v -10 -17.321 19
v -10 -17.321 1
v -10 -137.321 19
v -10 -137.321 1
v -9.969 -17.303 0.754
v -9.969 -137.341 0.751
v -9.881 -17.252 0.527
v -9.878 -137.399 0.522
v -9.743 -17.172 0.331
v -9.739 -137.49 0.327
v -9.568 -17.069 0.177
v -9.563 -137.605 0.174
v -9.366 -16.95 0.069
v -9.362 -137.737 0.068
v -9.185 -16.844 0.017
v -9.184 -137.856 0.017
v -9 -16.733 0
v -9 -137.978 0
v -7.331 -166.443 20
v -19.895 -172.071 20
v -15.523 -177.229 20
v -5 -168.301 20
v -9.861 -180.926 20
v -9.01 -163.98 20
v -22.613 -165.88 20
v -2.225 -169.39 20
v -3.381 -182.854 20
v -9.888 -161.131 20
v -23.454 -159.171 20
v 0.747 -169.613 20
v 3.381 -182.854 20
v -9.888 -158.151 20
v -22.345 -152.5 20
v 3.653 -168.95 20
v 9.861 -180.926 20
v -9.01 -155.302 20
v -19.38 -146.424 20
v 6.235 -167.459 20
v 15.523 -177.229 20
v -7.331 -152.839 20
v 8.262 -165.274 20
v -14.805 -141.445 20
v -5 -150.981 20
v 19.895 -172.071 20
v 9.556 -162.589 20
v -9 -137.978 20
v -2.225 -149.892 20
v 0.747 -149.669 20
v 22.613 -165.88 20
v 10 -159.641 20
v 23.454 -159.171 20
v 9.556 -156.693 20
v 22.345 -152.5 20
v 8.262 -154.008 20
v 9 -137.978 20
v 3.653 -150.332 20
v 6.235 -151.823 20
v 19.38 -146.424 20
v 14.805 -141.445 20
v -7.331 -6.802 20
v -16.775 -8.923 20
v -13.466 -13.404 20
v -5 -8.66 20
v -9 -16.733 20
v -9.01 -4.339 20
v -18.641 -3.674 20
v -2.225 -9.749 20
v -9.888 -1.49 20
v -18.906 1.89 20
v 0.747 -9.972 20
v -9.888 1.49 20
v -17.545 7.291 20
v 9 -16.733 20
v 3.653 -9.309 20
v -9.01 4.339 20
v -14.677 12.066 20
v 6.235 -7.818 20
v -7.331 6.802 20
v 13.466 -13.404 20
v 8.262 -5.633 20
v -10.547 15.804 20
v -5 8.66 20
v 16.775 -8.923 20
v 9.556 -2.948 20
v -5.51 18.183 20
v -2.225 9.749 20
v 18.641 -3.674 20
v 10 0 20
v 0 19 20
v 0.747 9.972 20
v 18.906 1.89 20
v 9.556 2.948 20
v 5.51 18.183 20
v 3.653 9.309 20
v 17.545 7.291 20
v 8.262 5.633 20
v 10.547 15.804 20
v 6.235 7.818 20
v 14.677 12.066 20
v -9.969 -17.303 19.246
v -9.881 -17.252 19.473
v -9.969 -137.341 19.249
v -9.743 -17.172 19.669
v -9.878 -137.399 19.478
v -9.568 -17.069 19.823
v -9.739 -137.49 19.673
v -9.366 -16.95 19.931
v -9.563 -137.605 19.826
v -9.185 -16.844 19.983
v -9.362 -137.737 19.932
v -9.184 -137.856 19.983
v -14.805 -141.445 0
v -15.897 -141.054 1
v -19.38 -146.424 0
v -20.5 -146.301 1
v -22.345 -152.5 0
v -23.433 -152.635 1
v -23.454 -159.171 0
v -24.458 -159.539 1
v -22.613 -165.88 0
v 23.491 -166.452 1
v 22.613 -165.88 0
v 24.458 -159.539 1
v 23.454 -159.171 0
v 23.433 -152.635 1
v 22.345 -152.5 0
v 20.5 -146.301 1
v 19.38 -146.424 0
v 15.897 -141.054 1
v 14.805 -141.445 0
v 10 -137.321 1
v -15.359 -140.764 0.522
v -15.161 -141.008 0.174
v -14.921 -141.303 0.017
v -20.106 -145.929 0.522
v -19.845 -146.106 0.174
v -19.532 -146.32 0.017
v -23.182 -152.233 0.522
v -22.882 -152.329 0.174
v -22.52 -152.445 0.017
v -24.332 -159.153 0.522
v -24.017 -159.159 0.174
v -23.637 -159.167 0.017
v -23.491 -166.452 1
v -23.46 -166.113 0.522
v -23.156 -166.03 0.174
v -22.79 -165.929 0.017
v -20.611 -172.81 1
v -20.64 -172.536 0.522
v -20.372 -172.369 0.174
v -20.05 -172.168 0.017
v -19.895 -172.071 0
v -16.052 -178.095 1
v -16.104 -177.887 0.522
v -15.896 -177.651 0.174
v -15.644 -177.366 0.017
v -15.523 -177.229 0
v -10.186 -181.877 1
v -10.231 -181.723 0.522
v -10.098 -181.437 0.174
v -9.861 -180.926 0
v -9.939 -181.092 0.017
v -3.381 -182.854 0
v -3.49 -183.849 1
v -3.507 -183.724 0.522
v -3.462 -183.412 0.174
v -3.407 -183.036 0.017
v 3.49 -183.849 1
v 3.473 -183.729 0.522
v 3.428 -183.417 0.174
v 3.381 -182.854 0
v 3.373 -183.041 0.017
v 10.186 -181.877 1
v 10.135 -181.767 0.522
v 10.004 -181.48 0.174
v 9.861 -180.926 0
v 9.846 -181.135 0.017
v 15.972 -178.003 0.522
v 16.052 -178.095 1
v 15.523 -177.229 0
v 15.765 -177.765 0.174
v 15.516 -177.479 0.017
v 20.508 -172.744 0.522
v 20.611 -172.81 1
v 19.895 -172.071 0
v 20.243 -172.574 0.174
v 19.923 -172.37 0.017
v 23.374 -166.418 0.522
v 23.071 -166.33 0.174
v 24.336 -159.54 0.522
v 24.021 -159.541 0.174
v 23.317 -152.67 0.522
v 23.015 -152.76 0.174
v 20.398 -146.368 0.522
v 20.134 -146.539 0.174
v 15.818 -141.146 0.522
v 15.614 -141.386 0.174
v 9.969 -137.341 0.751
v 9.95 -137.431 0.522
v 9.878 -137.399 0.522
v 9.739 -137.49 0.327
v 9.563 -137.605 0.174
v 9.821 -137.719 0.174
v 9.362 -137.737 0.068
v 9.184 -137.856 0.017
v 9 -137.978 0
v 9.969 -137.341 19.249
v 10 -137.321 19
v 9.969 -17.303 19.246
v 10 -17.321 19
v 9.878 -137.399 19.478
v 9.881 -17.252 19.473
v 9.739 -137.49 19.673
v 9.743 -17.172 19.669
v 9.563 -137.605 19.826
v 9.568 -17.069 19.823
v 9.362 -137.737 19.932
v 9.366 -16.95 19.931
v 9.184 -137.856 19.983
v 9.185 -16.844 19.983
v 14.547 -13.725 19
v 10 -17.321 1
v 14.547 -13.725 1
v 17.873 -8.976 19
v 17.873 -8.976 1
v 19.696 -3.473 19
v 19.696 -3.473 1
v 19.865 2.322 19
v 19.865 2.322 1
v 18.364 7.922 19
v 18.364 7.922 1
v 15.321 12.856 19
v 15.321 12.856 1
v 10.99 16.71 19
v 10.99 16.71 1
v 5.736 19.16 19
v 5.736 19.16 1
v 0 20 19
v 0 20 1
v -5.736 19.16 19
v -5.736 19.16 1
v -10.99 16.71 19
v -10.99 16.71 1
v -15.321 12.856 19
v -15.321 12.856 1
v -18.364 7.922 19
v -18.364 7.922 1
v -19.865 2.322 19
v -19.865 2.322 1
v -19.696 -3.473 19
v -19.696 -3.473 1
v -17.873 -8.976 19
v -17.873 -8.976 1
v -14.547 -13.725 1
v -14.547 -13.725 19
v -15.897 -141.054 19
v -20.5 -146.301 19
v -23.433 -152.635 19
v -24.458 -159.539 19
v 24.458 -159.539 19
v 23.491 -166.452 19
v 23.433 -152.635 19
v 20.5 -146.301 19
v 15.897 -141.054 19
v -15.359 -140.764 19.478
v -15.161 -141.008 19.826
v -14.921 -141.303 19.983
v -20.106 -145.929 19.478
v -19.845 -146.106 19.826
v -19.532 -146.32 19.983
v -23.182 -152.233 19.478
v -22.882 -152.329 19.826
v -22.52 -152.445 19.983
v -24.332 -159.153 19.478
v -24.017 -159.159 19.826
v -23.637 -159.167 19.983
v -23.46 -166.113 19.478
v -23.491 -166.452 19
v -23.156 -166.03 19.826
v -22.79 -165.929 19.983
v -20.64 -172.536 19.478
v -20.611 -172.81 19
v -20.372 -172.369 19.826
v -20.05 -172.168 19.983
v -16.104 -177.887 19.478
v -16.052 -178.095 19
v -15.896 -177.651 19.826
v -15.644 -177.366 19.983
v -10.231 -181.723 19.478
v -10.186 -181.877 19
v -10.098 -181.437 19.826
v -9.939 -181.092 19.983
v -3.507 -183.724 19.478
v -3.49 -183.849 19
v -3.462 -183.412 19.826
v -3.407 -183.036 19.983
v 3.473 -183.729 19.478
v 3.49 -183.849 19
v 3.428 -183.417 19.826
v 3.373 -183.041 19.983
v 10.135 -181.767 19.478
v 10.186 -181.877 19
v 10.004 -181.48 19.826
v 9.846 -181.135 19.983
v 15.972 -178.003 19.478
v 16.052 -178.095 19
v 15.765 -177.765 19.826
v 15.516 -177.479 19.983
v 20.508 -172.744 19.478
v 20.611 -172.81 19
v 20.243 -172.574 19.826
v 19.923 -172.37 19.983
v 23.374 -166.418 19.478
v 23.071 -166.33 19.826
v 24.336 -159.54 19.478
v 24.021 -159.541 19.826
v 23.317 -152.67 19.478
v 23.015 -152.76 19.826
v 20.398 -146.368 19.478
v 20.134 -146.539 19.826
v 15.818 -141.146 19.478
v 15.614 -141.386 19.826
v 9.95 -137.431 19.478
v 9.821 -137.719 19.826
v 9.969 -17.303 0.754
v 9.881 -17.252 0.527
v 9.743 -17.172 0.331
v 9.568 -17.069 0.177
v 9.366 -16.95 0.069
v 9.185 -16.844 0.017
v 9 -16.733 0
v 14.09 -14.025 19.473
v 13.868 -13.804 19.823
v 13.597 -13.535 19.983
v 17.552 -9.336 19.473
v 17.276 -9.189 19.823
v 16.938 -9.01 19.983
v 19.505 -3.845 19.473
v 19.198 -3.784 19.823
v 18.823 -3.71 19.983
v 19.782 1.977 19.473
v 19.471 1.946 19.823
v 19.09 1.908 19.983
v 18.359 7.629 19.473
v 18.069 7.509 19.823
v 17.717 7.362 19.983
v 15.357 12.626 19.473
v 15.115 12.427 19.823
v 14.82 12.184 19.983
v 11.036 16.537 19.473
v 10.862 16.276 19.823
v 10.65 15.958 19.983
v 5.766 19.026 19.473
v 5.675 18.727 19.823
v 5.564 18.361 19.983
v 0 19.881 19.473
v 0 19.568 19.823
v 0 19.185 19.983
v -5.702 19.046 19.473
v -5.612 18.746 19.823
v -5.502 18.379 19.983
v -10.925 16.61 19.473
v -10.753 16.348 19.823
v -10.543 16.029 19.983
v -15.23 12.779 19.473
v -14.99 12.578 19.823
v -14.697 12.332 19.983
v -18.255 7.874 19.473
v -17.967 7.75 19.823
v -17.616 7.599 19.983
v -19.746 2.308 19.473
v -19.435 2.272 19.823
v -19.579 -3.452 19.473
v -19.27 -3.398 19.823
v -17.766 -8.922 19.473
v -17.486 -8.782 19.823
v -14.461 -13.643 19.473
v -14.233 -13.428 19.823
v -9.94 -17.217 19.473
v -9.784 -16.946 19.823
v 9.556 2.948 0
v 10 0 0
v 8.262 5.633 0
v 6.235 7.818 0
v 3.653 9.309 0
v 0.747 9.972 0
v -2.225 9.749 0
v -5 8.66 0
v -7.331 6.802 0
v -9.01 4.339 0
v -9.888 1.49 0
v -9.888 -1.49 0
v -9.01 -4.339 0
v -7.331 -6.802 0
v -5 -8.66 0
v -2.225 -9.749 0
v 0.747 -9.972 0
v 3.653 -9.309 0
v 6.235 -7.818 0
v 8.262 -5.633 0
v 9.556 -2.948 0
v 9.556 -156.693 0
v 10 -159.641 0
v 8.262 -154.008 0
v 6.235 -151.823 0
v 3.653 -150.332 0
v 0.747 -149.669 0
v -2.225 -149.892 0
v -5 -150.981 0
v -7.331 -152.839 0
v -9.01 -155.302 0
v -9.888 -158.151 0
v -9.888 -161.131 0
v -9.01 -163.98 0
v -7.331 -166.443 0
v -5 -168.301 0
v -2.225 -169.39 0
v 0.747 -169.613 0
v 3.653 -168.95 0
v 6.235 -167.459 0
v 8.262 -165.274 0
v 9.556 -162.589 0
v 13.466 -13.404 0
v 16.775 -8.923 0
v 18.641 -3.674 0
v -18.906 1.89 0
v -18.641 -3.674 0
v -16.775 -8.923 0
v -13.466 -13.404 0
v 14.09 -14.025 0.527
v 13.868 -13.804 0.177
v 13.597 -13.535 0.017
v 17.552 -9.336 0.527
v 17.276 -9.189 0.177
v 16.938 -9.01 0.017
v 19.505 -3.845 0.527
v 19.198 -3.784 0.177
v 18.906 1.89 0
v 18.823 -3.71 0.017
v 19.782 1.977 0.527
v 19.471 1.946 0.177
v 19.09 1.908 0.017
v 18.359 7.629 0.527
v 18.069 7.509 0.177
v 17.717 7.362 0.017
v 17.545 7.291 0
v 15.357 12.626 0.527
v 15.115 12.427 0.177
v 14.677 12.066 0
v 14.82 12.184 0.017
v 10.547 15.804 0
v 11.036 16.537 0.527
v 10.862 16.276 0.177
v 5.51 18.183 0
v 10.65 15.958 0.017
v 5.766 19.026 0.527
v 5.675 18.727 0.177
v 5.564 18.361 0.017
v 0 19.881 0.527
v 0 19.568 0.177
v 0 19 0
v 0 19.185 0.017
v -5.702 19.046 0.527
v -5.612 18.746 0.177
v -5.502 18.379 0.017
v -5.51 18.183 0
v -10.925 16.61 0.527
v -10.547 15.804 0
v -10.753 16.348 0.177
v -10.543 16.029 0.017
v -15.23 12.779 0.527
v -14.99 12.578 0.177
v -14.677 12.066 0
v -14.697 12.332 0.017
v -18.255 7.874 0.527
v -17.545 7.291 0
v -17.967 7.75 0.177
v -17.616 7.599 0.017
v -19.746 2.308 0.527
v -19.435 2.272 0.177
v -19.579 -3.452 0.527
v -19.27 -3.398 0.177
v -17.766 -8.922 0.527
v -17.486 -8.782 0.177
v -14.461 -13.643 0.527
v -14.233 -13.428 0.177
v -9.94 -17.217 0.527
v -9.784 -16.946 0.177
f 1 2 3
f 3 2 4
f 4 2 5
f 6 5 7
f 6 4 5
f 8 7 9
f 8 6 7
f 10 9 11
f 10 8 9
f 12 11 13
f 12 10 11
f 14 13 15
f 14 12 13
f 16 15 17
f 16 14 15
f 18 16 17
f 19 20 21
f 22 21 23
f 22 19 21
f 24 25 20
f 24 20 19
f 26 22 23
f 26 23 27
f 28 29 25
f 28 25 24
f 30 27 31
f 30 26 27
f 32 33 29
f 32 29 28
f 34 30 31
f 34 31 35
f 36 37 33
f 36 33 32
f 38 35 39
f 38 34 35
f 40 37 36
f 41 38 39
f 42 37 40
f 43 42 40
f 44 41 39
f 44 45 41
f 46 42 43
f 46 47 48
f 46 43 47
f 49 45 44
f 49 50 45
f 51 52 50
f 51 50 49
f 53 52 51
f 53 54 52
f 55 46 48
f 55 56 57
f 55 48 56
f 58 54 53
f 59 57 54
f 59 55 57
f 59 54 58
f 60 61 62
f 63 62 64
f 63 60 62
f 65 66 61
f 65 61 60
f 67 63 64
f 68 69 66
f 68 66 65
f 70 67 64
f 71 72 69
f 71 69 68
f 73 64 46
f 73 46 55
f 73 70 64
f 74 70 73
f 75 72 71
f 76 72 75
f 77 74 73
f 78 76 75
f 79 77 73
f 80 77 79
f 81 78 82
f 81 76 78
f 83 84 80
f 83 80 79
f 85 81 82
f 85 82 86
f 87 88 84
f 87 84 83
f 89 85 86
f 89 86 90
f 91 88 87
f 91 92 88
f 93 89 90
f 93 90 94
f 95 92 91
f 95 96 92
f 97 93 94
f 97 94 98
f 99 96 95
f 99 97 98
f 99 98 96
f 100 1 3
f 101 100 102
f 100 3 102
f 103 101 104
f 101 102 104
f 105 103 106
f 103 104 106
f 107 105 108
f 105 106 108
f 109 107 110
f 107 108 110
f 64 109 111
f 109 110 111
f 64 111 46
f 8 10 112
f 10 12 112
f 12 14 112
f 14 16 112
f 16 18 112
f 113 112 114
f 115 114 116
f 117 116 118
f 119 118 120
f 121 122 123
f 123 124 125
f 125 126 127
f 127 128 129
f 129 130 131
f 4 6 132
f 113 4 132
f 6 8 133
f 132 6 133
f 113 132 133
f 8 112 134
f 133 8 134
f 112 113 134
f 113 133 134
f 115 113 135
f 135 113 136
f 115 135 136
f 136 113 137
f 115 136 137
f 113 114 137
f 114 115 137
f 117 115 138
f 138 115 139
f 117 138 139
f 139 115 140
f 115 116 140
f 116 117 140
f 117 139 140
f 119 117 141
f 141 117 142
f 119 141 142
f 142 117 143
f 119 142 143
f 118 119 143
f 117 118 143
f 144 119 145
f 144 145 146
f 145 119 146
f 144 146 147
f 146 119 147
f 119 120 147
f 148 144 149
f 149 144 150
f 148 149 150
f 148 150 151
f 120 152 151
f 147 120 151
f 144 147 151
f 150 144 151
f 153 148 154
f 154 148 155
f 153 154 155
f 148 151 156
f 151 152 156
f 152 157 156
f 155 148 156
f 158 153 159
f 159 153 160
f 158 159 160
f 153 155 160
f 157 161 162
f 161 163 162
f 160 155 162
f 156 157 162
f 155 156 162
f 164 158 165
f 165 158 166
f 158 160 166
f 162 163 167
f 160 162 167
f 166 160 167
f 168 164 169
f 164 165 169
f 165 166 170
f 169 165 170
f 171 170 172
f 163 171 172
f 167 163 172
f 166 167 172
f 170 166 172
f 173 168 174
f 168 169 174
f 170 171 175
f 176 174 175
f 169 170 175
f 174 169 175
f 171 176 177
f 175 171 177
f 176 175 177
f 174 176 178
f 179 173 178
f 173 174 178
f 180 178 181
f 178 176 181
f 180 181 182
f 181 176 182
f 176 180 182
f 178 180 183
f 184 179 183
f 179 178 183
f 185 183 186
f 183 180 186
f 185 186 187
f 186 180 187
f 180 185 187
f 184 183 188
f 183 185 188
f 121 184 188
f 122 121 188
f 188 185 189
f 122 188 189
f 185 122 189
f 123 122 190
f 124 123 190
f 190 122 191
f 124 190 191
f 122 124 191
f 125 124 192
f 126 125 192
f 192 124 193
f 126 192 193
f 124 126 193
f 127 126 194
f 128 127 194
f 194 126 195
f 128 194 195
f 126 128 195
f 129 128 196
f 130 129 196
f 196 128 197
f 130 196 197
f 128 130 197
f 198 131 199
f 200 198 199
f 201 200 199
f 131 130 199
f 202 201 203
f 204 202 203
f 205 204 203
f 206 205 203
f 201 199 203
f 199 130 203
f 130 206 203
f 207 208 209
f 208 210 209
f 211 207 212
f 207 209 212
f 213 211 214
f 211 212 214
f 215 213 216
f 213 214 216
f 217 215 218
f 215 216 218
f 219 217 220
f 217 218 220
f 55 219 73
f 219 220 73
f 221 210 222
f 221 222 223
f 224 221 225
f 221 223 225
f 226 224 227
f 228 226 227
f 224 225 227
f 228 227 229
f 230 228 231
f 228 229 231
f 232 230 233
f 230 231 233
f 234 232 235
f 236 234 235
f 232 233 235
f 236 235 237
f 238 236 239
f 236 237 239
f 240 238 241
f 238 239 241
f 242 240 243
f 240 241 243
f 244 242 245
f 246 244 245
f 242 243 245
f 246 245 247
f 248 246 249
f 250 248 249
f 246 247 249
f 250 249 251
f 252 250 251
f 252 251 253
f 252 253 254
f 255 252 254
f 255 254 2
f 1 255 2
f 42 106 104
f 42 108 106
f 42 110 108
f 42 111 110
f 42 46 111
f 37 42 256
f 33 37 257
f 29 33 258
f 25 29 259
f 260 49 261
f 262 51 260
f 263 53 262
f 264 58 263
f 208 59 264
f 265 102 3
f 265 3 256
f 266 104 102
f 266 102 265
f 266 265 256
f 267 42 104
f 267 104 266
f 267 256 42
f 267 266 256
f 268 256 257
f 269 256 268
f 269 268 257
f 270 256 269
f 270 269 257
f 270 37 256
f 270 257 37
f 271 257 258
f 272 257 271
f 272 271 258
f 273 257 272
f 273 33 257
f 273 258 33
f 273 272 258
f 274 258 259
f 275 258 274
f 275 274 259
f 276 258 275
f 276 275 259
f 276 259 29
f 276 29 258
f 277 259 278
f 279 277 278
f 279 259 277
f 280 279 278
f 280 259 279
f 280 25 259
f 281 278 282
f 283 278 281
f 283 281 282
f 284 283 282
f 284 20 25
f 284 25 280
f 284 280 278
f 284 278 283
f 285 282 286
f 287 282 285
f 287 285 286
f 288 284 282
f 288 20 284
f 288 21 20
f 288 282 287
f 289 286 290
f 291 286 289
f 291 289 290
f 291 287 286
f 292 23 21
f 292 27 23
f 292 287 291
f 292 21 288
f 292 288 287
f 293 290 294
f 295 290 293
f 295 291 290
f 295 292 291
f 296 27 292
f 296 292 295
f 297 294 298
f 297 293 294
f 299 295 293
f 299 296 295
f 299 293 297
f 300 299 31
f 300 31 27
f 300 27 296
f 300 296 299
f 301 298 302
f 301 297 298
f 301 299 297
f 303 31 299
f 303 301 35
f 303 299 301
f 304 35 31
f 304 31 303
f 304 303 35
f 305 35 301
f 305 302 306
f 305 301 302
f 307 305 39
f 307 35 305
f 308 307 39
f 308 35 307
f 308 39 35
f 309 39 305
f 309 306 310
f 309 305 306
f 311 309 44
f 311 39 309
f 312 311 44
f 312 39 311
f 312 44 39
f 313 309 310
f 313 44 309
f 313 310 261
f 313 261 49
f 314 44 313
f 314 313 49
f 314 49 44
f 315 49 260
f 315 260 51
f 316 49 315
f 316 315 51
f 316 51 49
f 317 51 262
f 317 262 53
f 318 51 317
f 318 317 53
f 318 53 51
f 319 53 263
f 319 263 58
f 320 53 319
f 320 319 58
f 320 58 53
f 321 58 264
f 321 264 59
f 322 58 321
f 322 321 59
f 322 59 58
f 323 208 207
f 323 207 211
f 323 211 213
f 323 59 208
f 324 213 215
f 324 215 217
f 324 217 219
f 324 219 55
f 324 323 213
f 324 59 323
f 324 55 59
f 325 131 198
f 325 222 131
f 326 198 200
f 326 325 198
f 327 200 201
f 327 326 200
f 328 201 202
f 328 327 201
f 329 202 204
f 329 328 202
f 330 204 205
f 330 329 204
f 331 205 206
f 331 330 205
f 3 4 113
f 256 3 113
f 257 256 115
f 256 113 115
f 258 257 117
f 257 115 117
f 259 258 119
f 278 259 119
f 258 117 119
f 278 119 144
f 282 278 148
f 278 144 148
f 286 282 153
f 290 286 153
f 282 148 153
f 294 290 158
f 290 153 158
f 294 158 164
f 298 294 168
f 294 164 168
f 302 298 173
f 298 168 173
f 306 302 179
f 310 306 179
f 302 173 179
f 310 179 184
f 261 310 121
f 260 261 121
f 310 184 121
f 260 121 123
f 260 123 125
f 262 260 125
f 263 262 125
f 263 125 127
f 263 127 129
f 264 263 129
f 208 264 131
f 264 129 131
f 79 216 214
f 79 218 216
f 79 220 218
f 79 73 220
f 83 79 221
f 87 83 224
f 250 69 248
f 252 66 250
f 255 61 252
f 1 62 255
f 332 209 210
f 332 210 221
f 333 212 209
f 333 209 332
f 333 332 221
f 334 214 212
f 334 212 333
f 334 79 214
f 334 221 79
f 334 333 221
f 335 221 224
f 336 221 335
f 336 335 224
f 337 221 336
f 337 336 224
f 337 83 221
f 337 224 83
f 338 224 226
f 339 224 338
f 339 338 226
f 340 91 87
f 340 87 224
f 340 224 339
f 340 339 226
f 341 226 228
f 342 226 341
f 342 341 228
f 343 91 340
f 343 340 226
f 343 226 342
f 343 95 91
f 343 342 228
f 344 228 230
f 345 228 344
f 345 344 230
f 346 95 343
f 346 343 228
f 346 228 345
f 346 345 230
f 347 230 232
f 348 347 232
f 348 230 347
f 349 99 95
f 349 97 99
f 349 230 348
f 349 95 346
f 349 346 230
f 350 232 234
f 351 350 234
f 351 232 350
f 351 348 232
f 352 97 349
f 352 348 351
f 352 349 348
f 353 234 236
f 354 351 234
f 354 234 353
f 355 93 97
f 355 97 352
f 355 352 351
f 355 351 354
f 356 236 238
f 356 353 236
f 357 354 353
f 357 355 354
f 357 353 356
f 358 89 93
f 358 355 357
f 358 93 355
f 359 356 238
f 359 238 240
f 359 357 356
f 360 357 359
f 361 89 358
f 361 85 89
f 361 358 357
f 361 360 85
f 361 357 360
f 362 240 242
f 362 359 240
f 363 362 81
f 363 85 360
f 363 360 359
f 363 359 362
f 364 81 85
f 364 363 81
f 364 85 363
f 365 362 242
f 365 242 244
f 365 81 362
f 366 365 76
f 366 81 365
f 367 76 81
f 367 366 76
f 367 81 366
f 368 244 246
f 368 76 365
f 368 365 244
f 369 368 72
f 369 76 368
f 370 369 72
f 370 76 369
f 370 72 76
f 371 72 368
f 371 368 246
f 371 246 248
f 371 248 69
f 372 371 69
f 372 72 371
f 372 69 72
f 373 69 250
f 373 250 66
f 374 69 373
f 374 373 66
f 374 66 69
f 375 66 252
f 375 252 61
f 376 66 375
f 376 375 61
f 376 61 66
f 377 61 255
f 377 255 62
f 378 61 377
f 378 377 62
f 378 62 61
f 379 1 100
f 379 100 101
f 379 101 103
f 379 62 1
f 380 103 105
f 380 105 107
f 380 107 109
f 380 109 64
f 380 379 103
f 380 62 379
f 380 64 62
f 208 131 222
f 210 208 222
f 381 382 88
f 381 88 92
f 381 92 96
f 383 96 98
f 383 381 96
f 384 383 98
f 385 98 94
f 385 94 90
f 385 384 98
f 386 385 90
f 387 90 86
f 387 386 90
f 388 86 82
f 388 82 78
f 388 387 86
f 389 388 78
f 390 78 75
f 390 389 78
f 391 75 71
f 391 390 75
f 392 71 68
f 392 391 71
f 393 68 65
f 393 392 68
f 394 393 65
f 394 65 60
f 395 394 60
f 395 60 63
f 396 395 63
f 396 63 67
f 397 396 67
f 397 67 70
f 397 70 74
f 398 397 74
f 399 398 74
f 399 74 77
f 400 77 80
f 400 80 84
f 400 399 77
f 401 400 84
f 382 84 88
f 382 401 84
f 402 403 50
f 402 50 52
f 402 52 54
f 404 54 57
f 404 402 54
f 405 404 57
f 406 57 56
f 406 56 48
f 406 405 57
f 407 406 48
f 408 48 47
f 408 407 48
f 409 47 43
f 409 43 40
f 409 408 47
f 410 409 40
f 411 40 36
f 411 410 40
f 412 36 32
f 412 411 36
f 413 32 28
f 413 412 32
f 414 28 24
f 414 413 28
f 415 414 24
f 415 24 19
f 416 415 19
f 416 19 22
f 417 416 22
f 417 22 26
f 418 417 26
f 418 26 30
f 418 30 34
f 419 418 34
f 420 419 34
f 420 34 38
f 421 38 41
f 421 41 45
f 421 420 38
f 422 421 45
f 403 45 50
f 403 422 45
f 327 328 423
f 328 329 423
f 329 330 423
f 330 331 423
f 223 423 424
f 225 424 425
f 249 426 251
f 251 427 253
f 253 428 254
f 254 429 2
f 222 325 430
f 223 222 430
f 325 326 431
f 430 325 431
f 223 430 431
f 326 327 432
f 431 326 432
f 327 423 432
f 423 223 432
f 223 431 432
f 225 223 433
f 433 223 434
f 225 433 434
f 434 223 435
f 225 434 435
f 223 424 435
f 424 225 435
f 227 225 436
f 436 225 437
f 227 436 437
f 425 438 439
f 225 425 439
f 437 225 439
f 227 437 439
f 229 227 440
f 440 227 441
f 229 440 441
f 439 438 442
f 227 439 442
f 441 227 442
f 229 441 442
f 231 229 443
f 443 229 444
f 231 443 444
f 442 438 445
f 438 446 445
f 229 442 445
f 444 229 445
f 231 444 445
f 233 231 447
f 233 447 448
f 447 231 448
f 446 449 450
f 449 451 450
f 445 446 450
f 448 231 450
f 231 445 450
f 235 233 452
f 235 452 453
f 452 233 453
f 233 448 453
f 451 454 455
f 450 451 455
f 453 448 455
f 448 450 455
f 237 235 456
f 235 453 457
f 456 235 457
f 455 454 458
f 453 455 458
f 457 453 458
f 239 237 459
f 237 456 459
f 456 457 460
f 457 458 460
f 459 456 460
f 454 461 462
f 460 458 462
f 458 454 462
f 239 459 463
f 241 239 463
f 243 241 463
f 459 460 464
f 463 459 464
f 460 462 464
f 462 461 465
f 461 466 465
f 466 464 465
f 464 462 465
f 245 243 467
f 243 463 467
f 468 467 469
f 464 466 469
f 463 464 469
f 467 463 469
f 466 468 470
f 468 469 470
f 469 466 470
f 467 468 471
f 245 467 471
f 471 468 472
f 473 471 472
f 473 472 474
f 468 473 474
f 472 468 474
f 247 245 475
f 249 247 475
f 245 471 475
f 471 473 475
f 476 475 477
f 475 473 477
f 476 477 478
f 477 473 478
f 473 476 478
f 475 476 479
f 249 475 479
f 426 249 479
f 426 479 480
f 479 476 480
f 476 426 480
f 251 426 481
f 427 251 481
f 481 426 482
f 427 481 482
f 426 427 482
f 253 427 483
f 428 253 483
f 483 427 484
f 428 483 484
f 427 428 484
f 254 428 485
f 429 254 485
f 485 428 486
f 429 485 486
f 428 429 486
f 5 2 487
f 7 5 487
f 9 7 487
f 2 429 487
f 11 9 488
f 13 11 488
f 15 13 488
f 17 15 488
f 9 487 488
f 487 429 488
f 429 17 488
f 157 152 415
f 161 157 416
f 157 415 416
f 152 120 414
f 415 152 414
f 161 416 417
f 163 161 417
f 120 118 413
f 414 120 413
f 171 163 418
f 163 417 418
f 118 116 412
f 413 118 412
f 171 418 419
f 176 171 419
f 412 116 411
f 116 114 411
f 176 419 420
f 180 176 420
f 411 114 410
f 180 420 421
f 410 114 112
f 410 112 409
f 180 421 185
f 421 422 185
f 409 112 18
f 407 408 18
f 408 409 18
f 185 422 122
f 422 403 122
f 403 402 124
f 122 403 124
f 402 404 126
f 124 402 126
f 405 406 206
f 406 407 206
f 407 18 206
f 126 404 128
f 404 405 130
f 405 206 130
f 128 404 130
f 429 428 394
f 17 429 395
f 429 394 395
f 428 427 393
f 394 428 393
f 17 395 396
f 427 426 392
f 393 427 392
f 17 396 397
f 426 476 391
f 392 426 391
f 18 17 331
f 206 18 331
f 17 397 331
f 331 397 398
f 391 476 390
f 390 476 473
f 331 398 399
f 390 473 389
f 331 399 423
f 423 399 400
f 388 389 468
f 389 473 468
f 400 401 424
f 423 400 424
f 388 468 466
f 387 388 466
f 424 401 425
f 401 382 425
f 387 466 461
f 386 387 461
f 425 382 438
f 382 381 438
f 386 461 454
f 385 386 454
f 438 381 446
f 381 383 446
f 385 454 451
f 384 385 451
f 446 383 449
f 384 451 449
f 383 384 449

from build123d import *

# Parameters (mm, degrees)
ESQUISSE1_R        = 10
BOSS_EXTRU_1_DEPTH = 20
CONG_2_R           = 1


with BuildPart() as part:
    # Esquisse1 → Boss.-Extru.1 (new body)
    with BuildSketch(Plane.XY):
        with BuildLine():
            Line((-10, -17.320508076), (-10, -137.320508076))
            ThreePointArc((-10, -137.320508076), (0, -184.099247501), (10, -137.320508076))
            Line((10, -137.320508076), (10, -17.320508076))
            ThreePointArc((10, -17.320508076), (0, 20), (-10, -17.320508076))
        make_face()
        Circle(ESQUISSE1_R, mode=Mode.SUBTRACT)
        with Locations((0, -159.641016151)):
            Circle(ESQUISSE1_R, mode=Mode.SUBTRACT)
    extrude(amount=BOSS_EXTRU_1_DEPTH)

    # Congé2
    cong_2_edges = [part.edges().sort_by_distance(p)[0] for p in [
        (0, -184.099247501, 20),
        (10, -77.320508076, 20),
        (0, 20, 20),
        (10, -77.320508076, 0),
        (0, -184.099247501, 0),
        (-10, -77.320508076, 0),
        (0, 20, 0),
        (-10, -77.320508076, 20),
    ]]
    fillet(cong_2_edges, radius=CONG_2_R)


solid = part.part
